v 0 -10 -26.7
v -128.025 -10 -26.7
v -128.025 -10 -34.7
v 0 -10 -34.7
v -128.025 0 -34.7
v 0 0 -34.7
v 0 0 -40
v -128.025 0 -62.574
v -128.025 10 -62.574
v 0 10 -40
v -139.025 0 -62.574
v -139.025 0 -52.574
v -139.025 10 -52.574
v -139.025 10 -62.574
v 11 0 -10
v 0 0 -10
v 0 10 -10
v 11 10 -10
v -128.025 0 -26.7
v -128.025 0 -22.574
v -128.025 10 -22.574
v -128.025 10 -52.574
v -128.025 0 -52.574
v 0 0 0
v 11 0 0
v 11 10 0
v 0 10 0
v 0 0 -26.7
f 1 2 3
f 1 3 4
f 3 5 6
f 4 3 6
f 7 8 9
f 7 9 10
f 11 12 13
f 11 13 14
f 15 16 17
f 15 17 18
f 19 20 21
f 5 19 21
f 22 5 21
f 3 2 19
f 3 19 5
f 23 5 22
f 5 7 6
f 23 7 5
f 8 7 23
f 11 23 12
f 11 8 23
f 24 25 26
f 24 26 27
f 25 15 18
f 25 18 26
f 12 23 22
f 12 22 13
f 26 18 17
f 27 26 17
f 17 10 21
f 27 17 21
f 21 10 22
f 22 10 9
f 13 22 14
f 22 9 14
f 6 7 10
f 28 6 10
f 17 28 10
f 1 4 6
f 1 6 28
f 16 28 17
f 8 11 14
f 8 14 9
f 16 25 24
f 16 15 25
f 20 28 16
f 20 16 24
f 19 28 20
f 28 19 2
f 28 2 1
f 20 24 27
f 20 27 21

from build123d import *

# Parameters (mm, degrees)
BOSS_EXTRUDE1_DEPTH = 10
SKETCH6_W           = 128.025007892
SKETCH6_H           = 8
BOSS_EXTRUDE3_DEPTH = 10


with BuildPart() as part:
    # Sketch1 → Boss-Extrude1 (new body)
    with BuildSketch(Plane(origin=(0, 0, 0), x_dir=(1, 0, 0), z_dir=(0, 1, 0))):
        Polygon((0, 0), (-128.025007892, 22.574263097), (-128.025007892, 52.574263097), (-139.025007892, 52.574263097), (-139.025007892, 62.574263097), (-128.025007892, 62.574263097), (0, 40), (0, 10), (11, 10), (11, 0), align=None)
    extrude(amount=BOSS_EXTRUDE1_DEPTH)

    # Sketch6 → Boss-Extrude3 (add)
    with BuildSketch(Plane.XZ):
        with Locations((-64.012503946, -30.7)):
            Rectangle(SKETCH6_W, SKETCH6_H)
    extrude(amount=BOSS_EXTRUDE3_DEPTH)


solid = part.part
